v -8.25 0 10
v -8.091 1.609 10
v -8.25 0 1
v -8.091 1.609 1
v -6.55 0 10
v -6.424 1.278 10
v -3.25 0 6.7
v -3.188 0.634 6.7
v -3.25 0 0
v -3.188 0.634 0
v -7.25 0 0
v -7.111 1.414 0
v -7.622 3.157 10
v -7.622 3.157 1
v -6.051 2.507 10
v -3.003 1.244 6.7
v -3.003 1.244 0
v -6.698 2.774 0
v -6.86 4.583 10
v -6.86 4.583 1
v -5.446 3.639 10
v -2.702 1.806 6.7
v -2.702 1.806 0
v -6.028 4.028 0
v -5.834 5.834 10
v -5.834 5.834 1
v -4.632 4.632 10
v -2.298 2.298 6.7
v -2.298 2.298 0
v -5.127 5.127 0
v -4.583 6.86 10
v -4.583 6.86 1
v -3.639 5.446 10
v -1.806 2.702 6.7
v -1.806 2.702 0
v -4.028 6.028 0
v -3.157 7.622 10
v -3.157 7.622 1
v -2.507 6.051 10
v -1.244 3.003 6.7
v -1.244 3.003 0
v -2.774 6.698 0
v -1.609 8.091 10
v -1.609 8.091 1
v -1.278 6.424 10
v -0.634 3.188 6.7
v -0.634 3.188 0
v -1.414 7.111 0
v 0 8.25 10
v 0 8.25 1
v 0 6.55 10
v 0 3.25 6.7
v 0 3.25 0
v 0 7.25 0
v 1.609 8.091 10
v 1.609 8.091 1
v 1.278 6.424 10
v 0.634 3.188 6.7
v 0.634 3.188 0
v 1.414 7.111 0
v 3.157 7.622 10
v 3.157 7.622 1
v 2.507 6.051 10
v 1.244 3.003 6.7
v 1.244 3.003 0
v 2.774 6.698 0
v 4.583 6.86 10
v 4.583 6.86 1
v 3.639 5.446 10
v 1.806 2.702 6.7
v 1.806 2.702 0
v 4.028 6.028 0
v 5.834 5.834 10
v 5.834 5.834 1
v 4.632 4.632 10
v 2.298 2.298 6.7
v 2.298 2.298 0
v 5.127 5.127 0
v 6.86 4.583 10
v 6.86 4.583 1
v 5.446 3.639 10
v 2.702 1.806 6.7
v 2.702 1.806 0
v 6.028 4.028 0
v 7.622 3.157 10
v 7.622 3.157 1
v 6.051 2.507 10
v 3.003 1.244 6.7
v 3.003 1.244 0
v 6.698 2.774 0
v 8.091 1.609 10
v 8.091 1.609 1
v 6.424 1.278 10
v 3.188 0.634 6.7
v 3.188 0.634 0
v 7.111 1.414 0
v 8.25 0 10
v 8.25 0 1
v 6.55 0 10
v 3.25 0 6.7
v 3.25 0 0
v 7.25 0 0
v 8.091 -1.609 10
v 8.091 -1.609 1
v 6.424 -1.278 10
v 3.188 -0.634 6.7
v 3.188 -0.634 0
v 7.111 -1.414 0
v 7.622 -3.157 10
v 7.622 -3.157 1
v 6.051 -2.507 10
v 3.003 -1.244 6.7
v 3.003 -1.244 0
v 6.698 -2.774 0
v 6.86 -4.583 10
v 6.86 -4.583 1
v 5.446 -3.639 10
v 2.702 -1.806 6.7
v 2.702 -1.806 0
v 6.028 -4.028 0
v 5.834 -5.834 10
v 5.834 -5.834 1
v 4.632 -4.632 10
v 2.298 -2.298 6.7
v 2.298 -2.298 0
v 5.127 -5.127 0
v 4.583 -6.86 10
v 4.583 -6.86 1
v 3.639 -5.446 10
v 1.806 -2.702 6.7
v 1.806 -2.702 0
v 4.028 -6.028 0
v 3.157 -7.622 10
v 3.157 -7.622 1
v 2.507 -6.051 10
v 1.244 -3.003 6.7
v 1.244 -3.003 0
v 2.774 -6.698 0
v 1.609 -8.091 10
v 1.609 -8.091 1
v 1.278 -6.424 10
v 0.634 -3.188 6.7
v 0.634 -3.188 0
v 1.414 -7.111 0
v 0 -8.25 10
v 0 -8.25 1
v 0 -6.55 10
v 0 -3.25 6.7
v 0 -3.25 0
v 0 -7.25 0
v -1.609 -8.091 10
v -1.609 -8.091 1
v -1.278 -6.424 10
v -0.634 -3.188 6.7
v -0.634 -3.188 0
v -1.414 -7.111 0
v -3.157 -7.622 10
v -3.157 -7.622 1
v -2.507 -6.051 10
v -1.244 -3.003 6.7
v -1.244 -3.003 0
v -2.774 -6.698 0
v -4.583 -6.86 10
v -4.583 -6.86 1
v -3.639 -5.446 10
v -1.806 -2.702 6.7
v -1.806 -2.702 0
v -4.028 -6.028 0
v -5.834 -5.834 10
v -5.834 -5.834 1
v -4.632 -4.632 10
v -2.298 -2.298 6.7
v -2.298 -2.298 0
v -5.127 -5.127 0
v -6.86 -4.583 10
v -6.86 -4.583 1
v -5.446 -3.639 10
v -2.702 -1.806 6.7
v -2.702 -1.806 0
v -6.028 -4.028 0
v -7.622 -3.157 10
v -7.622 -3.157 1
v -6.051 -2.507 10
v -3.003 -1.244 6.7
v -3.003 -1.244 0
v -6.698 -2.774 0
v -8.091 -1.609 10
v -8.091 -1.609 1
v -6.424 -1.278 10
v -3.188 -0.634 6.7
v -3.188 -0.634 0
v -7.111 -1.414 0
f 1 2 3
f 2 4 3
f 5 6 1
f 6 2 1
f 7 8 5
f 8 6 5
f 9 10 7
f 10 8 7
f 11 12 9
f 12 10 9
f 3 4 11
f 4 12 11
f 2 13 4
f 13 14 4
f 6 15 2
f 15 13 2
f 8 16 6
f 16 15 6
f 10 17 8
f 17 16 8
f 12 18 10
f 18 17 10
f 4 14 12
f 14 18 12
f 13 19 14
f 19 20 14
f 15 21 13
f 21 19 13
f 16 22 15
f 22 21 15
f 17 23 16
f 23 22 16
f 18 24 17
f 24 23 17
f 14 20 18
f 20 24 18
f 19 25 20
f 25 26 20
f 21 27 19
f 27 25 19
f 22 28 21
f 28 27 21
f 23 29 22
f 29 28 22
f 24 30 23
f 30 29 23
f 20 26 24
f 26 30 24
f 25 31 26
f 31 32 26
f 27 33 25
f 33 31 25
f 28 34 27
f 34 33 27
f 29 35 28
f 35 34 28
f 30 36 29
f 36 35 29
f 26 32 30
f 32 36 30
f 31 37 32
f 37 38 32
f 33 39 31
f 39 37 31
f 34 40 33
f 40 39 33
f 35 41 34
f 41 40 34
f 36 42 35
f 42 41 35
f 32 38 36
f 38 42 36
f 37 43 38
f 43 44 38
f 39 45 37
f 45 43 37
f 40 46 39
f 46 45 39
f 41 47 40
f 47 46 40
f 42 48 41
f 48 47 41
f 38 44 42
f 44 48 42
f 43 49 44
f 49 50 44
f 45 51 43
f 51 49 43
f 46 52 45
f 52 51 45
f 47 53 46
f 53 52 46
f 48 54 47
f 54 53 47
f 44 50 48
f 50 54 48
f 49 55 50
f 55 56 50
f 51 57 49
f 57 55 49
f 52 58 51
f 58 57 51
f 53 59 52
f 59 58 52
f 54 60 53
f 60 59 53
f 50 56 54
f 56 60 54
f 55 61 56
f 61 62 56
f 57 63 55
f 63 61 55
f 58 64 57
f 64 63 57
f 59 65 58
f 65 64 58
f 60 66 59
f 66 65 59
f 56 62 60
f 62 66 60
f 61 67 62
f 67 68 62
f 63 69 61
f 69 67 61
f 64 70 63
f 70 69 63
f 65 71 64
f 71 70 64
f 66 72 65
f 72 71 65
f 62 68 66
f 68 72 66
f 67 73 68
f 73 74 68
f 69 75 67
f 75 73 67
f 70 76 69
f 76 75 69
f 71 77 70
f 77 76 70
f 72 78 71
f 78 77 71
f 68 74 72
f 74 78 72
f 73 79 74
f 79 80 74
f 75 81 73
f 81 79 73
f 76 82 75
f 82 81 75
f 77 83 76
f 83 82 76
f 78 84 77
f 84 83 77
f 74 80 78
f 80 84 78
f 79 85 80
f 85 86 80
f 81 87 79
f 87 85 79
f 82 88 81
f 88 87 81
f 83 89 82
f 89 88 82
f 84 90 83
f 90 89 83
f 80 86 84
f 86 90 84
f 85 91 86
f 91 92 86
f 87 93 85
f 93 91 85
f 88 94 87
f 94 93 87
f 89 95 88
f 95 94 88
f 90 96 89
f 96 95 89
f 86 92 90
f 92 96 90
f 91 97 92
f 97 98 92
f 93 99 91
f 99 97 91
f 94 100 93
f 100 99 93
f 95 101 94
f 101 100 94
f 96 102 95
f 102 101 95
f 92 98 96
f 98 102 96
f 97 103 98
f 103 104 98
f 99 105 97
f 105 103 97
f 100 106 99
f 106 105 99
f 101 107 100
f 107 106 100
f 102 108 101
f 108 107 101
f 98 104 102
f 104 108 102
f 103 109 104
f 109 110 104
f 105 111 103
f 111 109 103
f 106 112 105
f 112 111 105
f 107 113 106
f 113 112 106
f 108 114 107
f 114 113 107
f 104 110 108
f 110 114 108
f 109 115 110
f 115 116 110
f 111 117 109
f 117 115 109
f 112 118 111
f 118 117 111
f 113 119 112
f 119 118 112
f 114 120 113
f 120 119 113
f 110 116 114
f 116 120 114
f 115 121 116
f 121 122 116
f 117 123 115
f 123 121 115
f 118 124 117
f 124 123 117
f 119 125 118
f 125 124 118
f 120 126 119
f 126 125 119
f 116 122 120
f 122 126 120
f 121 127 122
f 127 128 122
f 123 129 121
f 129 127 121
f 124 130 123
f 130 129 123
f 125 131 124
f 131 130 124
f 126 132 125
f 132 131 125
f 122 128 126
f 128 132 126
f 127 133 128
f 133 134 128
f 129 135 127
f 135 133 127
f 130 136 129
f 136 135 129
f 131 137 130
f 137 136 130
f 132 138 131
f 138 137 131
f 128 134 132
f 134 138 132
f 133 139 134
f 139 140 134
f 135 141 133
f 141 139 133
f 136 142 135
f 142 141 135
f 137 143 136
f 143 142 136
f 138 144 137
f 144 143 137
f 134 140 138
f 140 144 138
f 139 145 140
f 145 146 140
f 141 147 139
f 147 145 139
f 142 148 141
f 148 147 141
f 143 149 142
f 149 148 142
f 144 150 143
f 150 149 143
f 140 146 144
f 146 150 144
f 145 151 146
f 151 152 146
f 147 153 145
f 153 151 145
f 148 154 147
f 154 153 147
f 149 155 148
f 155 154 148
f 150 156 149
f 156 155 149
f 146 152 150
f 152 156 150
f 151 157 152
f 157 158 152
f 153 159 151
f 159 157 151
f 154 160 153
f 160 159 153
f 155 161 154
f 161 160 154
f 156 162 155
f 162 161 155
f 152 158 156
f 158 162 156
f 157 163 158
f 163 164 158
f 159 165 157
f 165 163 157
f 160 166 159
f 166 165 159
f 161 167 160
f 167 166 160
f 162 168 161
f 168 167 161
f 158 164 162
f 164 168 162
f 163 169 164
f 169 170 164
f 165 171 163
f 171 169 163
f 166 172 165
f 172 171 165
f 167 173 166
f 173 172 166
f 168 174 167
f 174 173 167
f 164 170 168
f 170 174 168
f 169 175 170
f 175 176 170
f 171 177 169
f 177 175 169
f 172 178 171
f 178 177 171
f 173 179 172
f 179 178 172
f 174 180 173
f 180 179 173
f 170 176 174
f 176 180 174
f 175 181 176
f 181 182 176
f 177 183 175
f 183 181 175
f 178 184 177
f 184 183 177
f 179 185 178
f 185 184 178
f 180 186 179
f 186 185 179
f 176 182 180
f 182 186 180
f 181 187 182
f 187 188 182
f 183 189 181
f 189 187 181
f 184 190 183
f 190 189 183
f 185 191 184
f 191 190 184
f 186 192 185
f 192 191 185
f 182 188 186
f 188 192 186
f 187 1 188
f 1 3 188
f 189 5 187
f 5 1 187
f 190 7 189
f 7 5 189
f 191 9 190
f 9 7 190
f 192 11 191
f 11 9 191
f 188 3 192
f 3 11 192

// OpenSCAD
$fn = 32;

// ----------------------------------------------------------------------
// Form washer: countersunk washer, 16.5 mm outside, 6.5 mm bore
// ----------------------------------------------------------------------

// --- parameters (mm) ---
revolve_angle = 360;      // full turn around the Z axis
profile_points = 6;       // points of the closed outline

profile = [[3.25, 0], [7.25, 0], [8.25, 1], [8.25, 10], [6.55, 10], [3.25, 6.7]];  // single closed polygon, 6 points, counter clockwise

// --- the one profile operation ---
rotate_extrude(angle = revolve_angle) polygon(points = profile);
